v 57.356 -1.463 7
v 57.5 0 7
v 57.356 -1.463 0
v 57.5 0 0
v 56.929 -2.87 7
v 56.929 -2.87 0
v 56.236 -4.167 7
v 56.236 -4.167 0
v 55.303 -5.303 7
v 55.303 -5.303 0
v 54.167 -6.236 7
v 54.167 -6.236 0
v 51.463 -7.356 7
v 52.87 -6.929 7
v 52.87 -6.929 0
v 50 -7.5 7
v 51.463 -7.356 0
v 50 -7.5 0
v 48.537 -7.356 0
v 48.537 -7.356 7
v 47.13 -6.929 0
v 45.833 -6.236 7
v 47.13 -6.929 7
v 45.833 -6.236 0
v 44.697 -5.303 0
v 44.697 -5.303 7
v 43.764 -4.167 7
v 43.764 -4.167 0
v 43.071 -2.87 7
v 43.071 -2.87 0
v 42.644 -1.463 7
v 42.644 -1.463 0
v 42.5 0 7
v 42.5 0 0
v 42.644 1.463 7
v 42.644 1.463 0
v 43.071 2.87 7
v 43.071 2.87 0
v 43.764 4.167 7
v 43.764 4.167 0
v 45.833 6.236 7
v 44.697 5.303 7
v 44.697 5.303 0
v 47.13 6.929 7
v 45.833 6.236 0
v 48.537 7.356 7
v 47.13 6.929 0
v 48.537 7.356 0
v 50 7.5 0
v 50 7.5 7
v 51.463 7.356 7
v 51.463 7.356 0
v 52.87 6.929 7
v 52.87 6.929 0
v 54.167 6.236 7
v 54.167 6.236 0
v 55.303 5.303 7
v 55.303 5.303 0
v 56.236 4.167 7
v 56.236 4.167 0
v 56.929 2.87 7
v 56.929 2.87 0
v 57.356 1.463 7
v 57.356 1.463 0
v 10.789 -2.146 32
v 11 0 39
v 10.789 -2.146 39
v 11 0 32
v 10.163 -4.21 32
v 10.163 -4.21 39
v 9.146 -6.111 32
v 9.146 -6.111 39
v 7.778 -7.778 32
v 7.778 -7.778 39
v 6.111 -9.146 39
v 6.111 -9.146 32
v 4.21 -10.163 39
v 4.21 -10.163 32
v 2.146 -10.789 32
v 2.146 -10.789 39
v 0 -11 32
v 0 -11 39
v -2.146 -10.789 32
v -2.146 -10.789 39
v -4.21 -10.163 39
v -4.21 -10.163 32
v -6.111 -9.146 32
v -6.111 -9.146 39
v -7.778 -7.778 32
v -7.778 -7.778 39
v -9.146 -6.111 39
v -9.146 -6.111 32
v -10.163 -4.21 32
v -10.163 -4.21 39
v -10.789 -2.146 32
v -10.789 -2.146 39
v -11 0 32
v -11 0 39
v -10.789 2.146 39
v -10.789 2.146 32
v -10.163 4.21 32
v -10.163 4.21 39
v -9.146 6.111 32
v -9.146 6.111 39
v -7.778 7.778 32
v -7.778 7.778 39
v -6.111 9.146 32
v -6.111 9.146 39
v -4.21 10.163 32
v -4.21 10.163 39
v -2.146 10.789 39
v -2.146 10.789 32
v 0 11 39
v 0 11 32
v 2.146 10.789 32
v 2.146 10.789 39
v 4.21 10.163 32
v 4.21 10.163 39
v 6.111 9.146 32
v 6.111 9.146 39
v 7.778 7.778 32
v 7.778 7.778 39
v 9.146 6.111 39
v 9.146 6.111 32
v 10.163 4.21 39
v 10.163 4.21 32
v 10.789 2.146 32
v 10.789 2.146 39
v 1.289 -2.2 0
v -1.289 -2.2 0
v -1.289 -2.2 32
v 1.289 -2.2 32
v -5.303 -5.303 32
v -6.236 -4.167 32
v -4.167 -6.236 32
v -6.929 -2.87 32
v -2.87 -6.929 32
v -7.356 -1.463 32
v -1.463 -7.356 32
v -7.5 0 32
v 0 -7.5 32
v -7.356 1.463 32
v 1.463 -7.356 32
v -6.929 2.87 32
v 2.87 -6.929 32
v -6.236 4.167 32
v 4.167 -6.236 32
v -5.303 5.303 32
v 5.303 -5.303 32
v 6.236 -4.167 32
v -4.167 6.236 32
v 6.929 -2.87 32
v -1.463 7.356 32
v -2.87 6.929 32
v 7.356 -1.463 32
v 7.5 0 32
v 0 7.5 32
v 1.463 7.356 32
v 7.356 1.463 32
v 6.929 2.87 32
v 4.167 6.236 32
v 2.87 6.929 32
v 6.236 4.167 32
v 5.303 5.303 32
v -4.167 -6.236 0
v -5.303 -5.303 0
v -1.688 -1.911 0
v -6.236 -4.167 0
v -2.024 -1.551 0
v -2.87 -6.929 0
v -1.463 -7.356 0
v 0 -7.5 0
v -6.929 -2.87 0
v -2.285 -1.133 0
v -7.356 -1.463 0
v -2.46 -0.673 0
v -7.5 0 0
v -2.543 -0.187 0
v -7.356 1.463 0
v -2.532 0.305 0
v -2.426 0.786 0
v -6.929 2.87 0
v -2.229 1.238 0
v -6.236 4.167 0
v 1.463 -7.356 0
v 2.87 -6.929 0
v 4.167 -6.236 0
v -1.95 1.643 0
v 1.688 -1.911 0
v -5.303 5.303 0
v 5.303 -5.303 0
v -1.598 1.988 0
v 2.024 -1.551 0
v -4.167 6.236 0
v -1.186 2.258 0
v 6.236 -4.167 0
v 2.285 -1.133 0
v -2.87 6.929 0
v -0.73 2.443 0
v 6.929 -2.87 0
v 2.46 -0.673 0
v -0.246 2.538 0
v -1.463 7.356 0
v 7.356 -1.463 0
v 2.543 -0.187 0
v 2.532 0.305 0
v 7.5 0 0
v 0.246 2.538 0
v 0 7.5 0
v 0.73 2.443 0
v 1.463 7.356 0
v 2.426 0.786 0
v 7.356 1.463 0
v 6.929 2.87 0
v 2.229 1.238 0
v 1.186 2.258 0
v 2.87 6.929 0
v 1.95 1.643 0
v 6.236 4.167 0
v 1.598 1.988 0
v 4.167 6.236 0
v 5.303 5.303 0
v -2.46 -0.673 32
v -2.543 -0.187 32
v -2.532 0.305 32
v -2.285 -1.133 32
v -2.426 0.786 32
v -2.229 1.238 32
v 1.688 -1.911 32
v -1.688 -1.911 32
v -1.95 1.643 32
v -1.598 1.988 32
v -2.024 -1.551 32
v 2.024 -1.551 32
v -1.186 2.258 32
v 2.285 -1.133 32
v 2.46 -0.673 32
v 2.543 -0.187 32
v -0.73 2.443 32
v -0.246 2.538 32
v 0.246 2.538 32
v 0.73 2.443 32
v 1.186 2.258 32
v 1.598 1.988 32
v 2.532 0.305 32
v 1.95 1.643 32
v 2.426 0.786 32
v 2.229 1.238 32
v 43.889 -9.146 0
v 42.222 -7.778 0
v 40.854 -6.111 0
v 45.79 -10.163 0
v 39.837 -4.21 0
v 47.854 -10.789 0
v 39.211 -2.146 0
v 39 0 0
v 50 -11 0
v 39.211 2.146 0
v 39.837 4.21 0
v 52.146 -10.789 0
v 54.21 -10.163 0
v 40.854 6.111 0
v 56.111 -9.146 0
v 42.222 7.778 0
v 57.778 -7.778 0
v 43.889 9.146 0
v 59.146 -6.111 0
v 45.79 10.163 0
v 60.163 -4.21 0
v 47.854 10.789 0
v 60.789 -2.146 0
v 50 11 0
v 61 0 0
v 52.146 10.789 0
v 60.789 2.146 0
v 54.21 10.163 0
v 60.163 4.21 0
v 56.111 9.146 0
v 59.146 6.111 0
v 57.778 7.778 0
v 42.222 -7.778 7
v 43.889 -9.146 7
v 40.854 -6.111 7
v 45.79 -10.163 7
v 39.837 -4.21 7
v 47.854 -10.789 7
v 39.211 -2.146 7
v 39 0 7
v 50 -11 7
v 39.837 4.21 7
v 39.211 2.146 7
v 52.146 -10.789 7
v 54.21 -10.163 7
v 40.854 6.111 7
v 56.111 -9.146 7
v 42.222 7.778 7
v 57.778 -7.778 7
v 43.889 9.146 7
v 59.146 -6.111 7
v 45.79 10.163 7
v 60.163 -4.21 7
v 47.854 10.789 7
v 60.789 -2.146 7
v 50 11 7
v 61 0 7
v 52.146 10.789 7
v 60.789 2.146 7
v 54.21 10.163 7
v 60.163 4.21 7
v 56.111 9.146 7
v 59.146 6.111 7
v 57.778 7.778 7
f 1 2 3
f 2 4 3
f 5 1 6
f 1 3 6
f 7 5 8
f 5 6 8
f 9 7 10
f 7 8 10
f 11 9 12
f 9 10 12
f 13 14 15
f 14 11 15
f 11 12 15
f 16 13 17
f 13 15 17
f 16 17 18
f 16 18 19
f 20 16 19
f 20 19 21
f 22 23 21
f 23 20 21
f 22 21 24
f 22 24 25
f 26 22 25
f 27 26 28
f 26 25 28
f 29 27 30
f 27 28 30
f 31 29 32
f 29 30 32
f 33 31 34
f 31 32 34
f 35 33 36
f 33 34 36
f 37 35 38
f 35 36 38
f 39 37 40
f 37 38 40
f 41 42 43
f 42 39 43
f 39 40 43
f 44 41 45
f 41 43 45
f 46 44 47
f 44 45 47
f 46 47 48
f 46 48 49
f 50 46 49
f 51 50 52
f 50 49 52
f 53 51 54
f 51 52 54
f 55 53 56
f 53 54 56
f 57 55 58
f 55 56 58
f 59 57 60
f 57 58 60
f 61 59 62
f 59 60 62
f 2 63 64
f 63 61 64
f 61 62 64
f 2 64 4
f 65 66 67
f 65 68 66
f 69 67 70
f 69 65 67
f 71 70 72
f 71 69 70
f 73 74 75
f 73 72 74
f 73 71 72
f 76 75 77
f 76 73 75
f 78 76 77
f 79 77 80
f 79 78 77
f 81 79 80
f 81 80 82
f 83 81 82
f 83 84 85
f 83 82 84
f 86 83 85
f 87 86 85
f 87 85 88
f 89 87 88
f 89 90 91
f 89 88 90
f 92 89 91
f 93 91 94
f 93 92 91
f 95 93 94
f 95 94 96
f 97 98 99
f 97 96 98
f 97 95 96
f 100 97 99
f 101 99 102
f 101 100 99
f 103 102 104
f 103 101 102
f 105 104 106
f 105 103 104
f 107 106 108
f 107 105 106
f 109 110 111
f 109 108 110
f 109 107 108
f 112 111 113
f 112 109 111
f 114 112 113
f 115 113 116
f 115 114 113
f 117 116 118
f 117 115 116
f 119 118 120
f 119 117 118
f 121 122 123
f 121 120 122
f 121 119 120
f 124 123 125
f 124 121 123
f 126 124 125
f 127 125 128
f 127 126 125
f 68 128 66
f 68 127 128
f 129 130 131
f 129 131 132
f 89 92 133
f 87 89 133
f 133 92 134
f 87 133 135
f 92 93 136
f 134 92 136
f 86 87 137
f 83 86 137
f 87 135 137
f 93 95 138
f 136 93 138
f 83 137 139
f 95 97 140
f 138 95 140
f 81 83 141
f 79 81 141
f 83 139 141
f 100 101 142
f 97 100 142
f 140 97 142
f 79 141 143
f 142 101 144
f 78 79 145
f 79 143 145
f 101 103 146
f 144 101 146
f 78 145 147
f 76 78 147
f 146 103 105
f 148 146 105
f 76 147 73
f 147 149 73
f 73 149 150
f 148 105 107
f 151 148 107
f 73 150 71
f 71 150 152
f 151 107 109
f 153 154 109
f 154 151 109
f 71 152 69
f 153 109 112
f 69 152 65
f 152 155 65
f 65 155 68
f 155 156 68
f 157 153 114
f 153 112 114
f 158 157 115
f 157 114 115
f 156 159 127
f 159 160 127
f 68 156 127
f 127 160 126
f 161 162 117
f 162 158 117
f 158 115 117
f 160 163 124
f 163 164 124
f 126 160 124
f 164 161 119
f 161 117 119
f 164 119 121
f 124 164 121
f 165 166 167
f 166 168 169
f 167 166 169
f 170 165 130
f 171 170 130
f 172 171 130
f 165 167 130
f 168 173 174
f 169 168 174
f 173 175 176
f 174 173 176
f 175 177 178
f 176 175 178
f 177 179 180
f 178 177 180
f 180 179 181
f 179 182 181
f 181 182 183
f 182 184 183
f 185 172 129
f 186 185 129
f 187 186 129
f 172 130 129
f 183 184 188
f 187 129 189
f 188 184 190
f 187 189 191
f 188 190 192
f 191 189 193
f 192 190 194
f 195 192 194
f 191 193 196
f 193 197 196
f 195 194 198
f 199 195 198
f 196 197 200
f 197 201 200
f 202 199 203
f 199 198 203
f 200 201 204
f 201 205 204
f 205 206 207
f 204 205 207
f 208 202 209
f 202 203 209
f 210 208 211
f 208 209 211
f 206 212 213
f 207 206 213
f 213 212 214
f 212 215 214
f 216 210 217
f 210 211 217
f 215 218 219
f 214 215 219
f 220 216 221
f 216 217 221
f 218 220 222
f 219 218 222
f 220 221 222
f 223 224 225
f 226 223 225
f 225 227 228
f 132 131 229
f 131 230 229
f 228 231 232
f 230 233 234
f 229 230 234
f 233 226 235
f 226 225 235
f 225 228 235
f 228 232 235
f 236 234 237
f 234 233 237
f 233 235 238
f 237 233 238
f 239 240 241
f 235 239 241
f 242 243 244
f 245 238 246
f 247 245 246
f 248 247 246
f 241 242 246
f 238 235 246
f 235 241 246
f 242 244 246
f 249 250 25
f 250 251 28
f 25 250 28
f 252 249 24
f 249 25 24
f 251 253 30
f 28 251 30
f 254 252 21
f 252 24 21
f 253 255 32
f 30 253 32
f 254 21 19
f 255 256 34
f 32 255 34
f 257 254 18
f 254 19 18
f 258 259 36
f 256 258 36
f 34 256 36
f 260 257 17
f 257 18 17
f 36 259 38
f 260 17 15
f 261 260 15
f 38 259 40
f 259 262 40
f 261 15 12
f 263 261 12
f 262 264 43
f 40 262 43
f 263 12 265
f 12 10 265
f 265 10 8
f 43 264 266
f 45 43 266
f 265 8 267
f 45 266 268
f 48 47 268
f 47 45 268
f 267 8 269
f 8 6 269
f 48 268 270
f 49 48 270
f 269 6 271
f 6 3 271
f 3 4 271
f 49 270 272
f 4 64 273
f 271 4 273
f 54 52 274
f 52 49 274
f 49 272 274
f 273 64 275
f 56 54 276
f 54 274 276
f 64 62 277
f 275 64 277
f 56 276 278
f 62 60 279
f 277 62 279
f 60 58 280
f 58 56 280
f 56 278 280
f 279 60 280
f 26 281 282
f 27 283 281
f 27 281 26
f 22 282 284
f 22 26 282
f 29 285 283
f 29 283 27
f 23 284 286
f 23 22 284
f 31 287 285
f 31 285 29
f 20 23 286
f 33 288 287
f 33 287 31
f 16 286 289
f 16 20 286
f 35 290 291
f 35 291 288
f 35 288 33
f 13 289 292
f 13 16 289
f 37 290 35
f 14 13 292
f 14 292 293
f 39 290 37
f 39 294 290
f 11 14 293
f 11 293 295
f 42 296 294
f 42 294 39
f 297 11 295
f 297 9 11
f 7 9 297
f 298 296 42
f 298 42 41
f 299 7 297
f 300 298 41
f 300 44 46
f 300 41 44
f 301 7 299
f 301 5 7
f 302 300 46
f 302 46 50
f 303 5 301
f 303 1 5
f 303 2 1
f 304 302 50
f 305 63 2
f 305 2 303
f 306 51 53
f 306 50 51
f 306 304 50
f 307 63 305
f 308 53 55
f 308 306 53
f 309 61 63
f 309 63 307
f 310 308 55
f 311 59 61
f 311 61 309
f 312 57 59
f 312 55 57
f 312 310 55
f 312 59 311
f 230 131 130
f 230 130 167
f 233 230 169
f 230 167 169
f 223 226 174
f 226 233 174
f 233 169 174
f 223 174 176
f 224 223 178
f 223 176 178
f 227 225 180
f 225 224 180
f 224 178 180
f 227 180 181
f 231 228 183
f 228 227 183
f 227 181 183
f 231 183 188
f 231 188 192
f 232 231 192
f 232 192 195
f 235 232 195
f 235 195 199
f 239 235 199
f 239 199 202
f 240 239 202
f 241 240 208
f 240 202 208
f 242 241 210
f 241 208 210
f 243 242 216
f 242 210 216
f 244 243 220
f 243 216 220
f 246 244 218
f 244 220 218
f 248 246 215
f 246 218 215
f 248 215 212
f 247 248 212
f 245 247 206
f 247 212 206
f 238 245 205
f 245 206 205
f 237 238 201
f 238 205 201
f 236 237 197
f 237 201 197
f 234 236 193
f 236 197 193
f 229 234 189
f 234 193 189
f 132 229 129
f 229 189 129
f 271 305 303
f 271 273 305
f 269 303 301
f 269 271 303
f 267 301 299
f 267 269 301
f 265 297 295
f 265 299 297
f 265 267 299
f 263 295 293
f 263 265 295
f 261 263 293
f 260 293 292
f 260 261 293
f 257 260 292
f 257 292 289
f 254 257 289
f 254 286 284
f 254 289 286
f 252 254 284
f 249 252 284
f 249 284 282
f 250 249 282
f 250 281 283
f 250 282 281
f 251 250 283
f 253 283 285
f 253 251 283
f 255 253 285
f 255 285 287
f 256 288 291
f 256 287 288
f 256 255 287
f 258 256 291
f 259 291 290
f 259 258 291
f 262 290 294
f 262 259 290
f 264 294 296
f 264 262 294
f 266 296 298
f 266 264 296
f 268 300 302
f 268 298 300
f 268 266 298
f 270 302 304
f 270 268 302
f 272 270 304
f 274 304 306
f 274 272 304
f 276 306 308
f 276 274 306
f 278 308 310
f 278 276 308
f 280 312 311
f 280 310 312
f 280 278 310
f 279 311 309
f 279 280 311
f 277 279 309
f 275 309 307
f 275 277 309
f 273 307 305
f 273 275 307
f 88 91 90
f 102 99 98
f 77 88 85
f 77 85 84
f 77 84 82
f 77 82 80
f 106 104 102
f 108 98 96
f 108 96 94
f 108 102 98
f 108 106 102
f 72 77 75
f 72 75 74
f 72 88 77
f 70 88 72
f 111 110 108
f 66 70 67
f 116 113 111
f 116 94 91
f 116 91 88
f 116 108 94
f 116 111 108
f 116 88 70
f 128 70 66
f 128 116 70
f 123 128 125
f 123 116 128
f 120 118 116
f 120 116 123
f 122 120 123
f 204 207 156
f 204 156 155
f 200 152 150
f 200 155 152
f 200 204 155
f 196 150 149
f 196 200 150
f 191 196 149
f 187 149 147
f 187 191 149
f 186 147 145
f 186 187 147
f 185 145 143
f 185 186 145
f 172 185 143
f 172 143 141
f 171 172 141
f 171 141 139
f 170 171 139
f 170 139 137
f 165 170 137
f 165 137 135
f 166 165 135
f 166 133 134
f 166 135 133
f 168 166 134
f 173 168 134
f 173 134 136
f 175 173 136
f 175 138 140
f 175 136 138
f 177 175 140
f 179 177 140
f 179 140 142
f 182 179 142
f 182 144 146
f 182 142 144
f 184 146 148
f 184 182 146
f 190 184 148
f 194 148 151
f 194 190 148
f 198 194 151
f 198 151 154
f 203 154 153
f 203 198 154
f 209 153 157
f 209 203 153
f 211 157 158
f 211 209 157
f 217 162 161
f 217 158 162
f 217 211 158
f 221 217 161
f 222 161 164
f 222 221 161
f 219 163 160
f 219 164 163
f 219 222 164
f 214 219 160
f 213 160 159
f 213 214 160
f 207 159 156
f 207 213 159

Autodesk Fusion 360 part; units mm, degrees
sketch "Sketch1" plane through (0, 0, 0) normal (0, 0, 1) x (1, 0, 0)
  line L0 (0, 0) -> (0, -2.6) construction
  line L1 (0, -2.6) -> (0, -2.2) construction
  line L2 (-1.2894, -2.2) -> (1.2894, -2.2)
  arc A0 (1.2894, -2.2) -> (-1.2894, -2.2) centre (0, 0) ccw
  circle A1 centre (0, 0) radius 7.5
  dimension "d34" = 5.1
  dimension "d36" = 0.4
  dimension "d37" = 15
extrude "Extrude9" add sketch "Sketch1" along normal blind 32 makes body 1
ref_plane "WorkPlane3" through (0, 0, 32) normal (0, 0, 1) x (1, 0, 0)
sketch "Sketch4" plane through (0, 0, 32) normal (0, 0, 1) x (1, 0, 0)
  circle A0 centre (0, 0) radius 11
  dimension "d41" = 22
extrude "Extrude10" add sketch "Sketch4" along normal blind 7 bodies 1
sketch "Sketch5" plane through (0, 0, 0) normal (0, 0, 1) x (1, 0, 0)
  line L0 (0, 0) -> (50, 0) construction
  circle A0 centre (50, 0) radius 7.5
  circle A1 centre (50, 0) radius 11
  dimension "d44" = 50
  dimension "d45" = 15
  dimension "d46" = 22
extrude "Extrude11" add sketch "Sketch5" along normal blind 7 separate body makes body 2
equation "holder_diameter = 15 mm"
equation "hole_diameter = 5.1 mm"
equation "indent_size = 0.4 mm"
equation "washer_height = 10 mm"
equation "metal_pole_height = 15 mm"
equation "wheel_thickness = 24 mm"
equation "wheel_hold_diameter = 8.1 mm"
equation "outside_wheel_cap_diameter = 22 mm"
equation "cap_thickness = 7 mm"
equation "d34 = hole_diameter"
equation "d36 = indent_size"
equation "d37 = holder_diameter"
equation "d38 = metal_pole_height + wheel_thickness - cap_thickness"
equation "d40 = metal_pole_height + wheel_thickness - cap_thickness"
equation "d41 = outside_wheel_cap_diameter"
equation "d42 = cap_thickness"
equation "d45 = holder_diameter"
equation "d46 = outside_wheel_cap_diameter"
equation "d47 = cap_thickness"
